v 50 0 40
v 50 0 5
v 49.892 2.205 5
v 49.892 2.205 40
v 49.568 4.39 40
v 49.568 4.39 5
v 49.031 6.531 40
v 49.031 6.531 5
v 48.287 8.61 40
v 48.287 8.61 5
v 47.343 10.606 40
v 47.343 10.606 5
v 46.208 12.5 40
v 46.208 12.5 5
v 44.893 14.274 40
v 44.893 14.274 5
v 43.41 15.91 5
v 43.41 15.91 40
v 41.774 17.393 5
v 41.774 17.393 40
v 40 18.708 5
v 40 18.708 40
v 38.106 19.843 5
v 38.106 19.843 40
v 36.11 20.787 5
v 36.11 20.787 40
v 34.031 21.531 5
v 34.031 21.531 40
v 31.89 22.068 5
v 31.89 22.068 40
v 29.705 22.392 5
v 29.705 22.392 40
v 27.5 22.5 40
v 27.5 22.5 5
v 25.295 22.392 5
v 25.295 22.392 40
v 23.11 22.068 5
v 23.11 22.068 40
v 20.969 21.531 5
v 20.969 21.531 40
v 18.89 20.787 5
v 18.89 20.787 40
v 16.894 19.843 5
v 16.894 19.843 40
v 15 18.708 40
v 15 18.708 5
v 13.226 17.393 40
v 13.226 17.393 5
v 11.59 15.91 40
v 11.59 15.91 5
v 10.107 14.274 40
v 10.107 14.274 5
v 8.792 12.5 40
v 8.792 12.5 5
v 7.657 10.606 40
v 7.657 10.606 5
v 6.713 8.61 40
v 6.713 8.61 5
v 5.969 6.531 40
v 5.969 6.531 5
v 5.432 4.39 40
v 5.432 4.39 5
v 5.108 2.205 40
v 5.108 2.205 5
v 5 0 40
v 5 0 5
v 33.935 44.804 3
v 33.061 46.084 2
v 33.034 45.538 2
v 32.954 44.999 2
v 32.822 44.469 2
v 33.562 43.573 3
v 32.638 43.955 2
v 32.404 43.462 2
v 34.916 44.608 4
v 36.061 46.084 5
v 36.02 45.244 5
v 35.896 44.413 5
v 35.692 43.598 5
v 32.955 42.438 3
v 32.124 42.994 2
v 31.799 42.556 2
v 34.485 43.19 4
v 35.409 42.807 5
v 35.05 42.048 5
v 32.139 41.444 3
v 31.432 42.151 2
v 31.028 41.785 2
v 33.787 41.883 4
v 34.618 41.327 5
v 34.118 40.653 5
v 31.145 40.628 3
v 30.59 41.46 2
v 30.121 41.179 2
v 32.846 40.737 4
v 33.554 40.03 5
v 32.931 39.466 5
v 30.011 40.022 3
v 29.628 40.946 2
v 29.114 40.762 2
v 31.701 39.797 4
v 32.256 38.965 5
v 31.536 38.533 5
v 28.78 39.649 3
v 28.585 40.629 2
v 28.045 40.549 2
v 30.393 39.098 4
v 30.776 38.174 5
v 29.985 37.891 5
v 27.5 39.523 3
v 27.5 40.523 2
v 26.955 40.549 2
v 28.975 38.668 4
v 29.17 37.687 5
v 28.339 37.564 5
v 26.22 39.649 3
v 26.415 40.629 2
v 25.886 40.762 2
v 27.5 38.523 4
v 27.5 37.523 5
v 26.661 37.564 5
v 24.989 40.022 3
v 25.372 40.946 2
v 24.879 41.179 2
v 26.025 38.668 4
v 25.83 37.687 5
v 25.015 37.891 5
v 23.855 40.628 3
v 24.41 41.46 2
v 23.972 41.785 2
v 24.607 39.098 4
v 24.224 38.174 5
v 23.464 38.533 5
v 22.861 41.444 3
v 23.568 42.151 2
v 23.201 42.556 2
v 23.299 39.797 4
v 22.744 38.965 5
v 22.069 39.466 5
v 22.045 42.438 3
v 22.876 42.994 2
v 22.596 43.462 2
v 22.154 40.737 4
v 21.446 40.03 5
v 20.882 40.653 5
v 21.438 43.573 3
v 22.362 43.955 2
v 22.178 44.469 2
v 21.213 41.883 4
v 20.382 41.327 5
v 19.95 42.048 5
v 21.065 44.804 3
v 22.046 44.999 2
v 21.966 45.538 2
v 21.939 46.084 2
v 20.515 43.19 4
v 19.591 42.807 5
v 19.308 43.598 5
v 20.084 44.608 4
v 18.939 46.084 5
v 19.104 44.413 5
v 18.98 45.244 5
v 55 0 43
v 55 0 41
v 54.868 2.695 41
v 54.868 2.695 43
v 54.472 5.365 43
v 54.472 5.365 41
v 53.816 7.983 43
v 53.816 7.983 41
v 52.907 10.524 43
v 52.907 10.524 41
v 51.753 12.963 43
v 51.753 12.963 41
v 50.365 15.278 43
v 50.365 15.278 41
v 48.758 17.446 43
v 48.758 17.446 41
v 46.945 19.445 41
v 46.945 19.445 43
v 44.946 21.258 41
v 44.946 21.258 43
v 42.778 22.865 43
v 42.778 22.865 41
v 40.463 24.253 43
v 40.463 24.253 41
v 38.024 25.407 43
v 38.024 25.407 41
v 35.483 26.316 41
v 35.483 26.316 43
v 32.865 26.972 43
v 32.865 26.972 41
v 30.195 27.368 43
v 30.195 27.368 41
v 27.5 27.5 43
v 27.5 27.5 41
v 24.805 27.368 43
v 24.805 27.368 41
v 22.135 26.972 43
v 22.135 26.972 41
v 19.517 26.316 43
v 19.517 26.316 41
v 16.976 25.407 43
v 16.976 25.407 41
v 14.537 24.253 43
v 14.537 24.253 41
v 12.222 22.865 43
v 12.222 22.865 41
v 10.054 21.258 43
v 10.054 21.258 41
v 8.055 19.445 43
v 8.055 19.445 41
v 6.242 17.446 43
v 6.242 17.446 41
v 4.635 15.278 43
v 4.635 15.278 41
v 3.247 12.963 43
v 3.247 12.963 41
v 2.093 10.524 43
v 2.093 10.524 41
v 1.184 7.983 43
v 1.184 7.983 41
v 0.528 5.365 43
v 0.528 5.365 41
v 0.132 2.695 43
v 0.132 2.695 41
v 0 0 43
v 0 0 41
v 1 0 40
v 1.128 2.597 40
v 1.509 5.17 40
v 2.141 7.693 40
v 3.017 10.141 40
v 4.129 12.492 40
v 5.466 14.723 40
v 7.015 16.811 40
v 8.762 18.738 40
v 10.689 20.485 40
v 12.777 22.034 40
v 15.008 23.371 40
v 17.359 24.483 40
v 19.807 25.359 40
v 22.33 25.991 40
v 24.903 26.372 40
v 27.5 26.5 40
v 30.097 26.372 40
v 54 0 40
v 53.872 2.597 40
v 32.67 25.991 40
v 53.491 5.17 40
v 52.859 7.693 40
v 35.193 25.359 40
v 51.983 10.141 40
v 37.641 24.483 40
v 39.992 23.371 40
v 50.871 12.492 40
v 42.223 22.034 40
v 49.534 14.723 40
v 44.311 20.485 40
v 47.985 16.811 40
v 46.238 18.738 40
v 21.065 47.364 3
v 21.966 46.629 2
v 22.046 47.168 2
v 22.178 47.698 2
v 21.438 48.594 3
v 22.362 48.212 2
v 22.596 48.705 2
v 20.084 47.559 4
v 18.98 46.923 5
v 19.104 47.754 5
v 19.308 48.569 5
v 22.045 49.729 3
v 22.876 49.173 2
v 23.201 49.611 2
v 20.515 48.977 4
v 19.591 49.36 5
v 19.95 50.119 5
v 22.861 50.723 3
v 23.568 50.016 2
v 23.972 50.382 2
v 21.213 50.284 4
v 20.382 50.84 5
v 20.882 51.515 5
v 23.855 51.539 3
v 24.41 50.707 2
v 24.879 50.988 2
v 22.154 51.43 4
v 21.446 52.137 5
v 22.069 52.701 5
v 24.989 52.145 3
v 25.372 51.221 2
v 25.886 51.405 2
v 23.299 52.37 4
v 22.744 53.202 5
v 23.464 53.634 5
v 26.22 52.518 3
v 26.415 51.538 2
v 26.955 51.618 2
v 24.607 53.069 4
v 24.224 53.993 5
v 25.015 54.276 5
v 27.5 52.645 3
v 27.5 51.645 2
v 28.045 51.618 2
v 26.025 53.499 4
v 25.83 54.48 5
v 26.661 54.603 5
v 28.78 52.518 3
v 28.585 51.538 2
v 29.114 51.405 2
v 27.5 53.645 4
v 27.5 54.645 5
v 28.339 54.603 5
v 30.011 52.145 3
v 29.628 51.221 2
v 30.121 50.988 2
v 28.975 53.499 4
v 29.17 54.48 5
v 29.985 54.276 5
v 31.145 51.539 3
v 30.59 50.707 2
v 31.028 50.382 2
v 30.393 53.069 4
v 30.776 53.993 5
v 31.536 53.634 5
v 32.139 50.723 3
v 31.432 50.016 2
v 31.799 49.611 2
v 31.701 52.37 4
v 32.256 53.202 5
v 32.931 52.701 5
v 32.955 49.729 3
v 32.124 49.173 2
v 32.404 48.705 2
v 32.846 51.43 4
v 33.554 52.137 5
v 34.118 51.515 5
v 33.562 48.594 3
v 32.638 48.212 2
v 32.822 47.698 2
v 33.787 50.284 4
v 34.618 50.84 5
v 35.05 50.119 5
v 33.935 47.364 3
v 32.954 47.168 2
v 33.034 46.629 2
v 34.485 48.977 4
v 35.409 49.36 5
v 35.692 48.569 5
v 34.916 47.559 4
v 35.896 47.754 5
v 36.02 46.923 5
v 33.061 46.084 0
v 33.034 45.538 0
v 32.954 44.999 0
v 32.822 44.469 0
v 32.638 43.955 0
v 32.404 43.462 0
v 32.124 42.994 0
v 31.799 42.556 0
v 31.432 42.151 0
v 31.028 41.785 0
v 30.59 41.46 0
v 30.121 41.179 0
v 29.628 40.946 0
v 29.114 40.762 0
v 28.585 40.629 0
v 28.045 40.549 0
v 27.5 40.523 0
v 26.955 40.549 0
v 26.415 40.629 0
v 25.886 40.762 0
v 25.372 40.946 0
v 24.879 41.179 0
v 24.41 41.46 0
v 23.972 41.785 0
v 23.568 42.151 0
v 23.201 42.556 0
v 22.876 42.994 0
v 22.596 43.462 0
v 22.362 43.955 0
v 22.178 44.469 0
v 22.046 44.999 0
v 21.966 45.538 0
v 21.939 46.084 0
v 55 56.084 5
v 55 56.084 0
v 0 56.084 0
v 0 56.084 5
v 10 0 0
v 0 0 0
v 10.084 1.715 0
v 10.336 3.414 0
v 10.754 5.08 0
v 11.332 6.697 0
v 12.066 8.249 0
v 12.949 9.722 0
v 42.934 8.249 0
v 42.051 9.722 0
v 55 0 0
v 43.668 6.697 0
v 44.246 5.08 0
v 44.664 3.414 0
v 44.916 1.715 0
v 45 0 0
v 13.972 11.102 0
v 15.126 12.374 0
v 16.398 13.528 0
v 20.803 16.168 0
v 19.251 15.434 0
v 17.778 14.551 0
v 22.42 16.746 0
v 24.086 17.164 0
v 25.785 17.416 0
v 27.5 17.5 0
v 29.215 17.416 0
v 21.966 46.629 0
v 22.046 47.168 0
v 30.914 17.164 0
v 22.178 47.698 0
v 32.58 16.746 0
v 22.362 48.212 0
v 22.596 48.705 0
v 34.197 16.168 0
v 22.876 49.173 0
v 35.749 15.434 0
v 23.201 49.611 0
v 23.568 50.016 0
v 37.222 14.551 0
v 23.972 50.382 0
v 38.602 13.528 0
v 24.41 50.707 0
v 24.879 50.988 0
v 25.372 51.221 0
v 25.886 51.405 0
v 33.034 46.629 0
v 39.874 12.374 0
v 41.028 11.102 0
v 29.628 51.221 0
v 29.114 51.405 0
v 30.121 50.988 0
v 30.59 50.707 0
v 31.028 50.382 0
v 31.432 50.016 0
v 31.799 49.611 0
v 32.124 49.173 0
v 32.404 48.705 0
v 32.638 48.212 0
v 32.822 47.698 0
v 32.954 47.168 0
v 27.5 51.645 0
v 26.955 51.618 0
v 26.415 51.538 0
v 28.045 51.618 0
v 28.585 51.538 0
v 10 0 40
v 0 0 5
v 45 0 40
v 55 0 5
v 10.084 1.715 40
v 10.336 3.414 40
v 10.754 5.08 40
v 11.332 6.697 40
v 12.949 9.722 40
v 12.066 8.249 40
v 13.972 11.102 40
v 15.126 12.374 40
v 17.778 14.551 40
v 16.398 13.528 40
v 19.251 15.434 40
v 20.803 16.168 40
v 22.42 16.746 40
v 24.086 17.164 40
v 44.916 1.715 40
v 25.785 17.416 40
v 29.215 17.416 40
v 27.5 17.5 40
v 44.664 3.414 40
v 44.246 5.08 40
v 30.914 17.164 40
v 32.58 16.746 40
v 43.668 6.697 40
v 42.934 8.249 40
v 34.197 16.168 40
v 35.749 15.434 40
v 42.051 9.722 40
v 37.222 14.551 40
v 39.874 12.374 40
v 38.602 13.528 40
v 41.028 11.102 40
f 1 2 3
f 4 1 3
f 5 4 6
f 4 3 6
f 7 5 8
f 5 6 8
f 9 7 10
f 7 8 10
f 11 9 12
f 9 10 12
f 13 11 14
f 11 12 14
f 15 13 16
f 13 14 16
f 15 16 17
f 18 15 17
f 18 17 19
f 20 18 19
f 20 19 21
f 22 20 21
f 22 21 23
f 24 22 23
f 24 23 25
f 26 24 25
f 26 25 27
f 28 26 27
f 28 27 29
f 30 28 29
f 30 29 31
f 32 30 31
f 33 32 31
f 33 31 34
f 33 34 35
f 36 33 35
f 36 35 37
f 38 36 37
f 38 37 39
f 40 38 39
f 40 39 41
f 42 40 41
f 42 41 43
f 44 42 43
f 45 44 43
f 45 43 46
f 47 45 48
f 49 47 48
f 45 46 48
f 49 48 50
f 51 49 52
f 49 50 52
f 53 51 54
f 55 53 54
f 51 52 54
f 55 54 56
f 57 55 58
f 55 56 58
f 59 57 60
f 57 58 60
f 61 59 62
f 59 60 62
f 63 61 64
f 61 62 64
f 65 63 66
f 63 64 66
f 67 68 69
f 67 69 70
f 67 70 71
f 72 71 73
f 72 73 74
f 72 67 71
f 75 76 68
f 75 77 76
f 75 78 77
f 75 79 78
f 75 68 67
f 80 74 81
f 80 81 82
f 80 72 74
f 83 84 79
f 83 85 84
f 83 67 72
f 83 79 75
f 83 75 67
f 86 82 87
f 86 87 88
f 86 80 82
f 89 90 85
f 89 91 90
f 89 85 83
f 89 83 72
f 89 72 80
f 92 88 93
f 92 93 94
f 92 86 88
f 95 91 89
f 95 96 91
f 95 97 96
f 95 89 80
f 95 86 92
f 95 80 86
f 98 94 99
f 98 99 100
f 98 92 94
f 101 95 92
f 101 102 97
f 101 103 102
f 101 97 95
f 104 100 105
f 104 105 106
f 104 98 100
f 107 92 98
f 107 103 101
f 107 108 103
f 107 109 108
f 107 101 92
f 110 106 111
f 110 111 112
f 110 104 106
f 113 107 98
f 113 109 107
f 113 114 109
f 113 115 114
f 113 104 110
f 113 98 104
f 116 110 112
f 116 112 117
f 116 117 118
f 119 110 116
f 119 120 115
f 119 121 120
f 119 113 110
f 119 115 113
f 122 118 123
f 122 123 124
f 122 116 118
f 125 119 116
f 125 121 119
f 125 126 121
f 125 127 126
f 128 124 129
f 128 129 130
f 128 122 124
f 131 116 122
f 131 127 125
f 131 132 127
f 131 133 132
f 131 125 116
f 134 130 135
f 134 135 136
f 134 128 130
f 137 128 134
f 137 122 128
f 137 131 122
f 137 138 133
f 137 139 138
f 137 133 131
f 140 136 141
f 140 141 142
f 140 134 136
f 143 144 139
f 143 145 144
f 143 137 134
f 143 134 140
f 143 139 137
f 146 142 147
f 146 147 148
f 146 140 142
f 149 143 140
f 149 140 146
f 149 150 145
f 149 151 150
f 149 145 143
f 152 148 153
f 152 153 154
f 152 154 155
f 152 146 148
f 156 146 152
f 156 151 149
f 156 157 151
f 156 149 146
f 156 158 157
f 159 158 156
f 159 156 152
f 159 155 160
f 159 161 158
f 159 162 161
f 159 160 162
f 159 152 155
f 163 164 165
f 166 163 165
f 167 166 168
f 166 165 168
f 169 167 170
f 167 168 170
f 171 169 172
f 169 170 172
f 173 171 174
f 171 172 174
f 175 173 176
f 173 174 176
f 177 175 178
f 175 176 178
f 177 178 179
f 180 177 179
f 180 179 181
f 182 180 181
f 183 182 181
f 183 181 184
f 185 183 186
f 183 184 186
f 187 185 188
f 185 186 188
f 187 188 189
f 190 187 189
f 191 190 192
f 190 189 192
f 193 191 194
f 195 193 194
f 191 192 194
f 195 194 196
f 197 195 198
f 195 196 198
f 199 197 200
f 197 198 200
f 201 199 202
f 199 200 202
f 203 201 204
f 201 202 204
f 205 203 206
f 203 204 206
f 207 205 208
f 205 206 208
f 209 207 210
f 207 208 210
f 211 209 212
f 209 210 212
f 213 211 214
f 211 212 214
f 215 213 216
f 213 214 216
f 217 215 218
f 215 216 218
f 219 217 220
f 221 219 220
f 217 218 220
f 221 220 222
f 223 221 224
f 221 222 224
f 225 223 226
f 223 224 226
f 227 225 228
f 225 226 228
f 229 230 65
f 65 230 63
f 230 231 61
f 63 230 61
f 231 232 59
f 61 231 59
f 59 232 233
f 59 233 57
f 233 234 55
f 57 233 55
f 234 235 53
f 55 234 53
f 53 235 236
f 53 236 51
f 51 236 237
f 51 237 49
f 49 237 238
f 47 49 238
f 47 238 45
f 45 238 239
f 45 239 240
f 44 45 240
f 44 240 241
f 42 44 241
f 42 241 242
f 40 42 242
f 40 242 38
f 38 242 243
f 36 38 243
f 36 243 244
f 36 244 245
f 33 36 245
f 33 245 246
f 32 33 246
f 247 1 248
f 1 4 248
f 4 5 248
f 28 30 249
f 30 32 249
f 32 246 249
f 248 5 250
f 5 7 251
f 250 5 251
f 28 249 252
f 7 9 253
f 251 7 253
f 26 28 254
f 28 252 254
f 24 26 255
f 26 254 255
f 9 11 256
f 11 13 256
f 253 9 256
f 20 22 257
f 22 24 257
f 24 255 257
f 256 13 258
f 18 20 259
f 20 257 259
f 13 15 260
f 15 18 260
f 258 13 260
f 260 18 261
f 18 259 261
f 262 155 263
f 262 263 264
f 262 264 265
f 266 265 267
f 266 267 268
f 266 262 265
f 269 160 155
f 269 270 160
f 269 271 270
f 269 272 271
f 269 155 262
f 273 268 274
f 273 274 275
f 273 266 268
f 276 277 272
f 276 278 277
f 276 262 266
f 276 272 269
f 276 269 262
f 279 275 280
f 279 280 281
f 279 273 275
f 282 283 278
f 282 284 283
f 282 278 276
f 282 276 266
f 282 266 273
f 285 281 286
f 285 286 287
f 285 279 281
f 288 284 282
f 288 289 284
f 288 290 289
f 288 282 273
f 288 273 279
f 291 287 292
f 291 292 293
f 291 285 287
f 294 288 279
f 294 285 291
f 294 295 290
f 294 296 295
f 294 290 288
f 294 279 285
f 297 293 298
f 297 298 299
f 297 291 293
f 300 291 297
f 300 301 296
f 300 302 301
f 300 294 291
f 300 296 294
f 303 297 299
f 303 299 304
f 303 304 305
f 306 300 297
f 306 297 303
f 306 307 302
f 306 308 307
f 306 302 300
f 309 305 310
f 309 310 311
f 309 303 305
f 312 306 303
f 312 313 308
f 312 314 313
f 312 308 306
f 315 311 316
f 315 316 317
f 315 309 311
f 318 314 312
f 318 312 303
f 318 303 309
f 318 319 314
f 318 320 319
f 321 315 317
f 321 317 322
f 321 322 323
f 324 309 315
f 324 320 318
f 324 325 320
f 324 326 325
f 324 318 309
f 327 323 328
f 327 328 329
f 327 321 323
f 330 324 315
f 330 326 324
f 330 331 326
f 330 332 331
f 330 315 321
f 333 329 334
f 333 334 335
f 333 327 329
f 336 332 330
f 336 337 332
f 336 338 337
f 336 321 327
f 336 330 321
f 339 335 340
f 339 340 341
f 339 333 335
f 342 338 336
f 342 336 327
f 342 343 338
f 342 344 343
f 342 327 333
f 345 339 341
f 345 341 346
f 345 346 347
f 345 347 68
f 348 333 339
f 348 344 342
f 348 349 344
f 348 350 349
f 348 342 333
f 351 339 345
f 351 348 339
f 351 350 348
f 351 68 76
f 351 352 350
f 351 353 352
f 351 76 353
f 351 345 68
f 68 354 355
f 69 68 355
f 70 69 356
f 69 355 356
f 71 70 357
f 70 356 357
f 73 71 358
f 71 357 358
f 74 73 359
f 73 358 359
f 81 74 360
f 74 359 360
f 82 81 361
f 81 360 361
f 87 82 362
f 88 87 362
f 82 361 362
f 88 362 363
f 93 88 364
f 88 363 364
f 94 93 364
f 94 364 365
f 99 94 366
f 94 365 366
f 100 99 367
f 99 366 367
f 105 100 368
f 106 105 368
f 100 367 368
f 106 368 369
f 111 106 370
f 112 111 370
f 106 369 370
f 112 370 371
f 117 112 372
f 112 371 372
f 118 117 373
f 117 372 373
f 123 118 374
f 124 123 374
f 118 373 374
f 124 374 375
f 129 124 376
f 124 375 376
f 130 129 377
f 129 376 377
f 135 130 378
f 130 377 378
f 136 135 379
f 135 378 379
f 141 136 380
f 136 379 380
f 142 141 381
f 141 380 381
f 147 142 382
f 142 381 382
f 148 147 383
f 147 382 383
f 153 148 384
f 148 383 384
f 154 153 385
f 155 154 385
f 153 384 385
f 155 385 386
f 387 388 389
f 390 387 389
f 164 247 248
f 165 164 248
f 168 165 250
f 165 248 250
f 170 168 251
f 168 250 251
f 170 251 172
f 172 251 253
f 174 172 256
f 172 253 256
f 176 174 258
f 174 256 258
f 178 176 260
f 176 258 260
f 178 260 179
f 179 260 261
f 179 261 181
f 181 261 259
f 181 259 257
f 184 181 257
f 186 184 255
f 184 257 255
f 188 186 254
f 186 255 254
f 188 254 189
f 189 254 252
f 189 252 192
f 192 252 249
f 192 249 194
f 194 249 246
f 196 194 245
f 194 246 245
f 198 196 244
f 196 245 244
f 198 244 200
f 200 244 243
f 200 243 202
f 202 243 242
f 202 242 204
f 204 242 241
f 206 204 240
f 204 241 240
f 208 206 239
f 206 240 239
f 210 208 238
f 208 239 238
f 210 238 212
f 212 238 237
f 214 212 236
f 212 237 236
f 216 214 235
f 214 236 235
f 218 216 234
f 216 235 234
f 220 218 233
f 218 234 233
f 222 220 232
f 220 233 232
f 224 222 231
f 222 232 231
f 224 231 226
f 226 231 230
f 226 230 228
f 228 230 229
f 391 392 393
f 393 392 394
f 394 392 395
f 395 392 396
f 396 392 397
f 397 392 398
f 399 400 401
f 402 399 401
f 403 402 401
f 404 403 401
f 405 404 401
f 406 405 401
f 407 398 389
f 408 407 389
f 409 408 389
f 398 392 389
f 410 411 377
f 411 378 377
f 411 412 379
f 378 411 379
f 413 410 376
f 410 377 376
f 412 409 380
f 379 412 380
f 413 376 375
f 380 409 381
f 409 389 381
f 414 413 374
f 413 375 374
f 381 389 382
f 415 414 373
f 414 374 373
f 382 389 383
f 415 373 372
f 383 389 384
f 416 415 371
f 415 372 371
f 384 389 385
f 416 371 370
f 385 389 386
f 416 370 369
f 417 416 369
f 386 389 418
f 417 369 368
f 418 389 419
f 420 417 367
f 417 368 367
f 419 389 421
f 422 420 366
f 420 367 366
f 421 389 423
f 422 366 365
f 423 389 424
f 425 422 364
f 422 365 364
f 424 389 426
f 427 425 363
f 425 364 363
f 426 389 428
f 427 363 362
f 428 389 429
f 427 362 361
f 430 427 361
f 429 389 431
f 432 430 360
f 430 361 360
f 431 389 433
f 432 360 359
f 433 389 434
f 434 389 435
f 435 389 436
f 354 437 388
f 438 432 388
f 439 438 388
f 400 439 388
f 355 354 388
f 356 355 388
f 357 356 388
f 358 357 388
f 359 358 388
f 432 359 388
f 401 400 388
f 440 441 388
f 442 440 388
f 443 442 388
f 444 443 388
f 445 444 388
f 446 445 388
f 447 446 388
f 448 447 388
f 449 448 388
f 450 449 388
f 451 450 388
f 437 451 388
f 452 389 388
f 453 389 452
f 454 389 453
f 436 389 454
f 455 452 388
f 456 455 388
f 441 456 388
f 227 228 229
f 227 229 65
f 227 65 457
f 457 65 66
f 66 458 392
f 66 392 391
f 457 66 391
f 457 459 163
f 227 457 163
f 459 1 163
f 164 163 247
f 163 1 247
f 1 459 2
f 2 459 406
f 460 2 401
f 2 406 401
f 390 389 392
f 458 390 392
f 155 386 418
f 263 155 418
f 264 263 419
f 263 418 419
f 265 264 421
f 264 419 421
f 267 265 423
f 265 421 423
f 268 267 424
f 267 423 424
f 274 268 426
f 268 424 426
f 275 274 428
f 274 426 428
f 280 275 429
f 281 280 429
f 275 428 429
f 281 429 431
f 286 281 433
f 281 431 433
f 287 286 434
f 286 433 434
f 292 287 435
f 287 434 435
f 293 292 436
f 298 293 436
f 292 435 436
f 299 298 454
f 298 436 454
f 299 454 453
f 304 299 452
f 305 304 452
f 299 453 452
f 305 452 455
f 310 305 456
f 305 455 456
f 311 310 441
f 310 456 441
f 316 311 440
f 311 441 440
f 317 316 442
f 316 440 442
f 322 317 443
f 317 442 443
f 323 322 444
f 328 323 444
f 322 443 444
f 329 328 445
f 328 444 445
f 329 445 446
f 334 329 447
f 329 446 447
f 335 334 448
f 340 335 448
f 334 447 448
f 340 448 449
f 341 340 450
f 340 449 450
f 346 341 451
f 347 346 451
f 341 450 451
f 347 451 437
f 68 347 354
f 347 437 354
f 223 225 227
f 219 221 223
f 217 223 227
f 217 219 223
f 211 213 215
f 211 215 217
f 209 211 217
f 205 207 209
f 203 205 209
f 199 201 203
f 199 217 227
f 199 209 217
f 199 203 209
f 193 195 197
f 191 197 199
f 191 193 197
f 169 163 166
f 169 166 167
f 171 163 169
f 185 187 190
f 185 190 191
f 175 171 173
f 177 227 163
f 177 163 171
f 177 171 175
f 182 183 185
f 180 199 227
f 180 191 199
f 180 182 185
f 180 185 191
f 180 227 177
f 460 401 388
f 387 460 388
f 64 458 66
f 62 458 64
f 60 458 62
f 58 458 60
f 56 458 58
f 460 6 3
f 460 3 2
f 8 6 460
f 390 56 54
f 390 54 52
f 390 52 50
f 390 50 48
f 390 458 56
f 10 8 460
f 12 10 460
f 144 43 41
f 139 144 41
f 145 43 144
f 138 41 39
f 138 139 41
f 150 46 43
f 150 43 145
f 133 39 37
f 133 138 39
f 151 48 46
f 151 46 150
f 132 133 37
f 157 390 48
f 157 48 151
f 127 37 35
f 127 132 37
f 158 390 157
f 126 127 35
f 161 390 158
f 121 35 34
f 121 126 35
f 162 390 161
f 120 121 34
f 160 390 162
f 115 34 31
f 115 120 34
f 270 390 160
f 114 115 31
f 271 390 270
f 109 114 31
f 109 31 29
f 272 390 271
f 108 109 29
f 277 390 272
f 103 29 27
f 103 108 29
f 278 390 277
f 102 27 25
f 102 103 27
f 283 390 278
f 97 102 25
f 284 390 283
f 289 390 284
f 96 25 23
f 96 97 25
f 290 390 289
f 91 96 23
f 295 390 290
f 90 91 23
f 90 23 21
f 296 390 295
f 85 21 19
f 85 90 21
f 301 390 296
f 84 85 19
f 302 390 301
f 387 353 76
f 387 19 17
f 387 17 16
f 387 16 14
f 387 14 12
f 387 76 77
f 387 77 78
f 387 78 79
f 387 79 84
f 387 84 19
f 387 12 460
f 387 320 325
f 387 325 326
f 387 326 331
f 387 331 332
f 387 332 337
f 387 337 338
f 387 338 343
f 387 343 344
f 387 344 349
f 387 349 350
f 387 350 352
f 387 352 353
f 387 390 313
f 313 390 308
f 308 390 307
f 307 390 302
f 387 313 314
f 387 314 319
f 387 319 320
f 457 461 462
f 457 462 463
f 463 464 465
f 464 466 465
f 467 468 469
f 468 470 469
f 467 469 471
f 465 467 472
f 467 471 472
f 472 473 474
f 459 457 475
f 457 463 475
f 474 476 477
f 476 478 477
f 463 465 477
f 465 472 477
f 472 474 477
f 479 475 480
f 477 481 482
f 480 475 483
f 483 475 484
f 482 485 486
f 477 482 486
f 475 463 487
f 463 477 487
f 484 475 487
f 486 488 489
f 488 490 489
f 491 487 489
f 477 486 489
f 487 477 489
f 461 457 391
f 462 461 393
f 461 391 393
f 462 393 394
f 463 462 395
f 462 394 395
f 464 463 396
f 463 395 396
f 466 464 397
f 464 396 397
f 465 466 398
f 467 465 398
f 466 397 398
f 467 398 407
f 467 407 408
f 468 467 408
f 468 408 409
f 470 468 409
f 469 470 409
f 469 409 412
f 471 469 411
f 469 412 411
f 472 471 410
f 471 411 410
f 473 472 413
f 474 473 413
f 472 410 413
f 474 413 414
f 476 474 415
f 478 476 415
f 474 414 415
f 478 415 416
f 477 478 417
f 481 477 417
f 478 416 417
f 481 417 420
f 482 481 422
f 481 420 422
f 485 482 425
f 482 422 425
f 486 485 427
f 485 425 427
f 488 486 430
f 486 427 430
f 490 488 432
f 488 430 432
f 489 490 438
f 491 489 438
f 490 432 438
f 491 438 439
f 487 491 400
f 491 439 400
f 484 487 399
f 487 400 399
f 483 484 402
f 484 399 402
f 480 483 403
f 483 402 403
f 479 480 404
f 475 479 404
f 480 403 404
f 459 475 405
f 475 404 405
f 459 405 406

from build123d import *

# Parameters (mm, degrees)
F1_DEPTH = 5
F2_DEPTH = 40
F3_SIZE  = 3
F5_DEPTH = 3
F6_SIZE  = 1


with BuildPart() as f1:
    # F0 (on Top) → F1 (new body)
    with BuildSketch(Plane.XY):
        with BuildLine():
            Line((55, 56.0835413635), (0, 56.0835413635))
            Line((0, 56.0835413635), (0, 46.0835413635))
            Line((0, 46.0835413635), (21.9390119762, 46.0835413635))
            ThreePointArc((21.9390119762, 46.0835413635), (27.5, 51.6445293873), (33.0609880238, 46.0835413635))
            Line((33.0609880238, 46.0835413635), (55, 46.0835413635))
            Line((55, 46.0835413635), (55, 56.0835413635))
        make_face()
        with BuildLine():
            Line((21.9390119762, 46.0835413635), (0, 46.0835413635))
            Line((0, 46.0835413635), (0, 0))
            Line((0, 0), (5, 0))
            ThreePointArc((5, 0), (27.5, 22.5), (50, 0))
            Line((50, 0), (55, 0))
            Line((55, 0), (55, 46.0835413635))
            Line((55, 46.0835413635), (33.0609880238, 46.0835413635))
            ThreePointArc((33.0609880238, 46.0835413635), (27.5, 40.5225533396), (21.9390119762, 46.0835413635))
        make_face()
    extrude(amount=F1_DEPTH)

    # F0 (on Top) → F2 (join)
    with BuildSketch(Plane.XY):
        with BuildLine():
            ThreePointArc((50, 0), (27.5, 22.5), (5, 0))
            Line((5, 0), (10, 0))
            ThreePointArc((10, 0), (27.5, 17.5), (45, 0))
            Line((45, 0), (50, 0))
        make_face()
    extrude(amount=F2_DEPTH)

    # F3
    f3_edges = [f1.edges().sort_by_distance(p)[0] for p in [
        (21.939012, 46.083541, 5),
    ]]
    chamfer(f3_edges, length=F3_SIZE)

    # F4 (on face) → F5 (join)
    with BuildSketch(Plane.XY.offset(40)):
        with BuildLine():
            Line((50, 0), (55, 0))
            ThreePointArc((55, 0), (27.5, 27.5), (0, 0))
            Line((0, 0), (5, 0))
            ThreePointArc((5, 0), (27.5, 22.5), (50, 0))
        make_face()
        with BuildLine():
            Line((45, 0), (50, 0))
            ThreePointArc((50, 0), (27.5, 22.5), (5, 0))
            Line((5, 0), (10, 0))
            ThreePointArc((10, 0), (27.5, 17.5), (45, 0))
        make_face()
        with BuildLine():
            Line((10, 0), (45, 0))
            ThreePointArc((45, 0), (27.5, 17.5), (10, 0))
        make_face()
    extrude(amount=F5_DEPTH)

    # F6
    f6_edges = [f1.edges().sort_by_distance(p)[0] for p in [
        (27.5, 27.5, 40),
    ]]
    chamfer(f6_edges, length=F6_SIZE)


solid = f1.part
